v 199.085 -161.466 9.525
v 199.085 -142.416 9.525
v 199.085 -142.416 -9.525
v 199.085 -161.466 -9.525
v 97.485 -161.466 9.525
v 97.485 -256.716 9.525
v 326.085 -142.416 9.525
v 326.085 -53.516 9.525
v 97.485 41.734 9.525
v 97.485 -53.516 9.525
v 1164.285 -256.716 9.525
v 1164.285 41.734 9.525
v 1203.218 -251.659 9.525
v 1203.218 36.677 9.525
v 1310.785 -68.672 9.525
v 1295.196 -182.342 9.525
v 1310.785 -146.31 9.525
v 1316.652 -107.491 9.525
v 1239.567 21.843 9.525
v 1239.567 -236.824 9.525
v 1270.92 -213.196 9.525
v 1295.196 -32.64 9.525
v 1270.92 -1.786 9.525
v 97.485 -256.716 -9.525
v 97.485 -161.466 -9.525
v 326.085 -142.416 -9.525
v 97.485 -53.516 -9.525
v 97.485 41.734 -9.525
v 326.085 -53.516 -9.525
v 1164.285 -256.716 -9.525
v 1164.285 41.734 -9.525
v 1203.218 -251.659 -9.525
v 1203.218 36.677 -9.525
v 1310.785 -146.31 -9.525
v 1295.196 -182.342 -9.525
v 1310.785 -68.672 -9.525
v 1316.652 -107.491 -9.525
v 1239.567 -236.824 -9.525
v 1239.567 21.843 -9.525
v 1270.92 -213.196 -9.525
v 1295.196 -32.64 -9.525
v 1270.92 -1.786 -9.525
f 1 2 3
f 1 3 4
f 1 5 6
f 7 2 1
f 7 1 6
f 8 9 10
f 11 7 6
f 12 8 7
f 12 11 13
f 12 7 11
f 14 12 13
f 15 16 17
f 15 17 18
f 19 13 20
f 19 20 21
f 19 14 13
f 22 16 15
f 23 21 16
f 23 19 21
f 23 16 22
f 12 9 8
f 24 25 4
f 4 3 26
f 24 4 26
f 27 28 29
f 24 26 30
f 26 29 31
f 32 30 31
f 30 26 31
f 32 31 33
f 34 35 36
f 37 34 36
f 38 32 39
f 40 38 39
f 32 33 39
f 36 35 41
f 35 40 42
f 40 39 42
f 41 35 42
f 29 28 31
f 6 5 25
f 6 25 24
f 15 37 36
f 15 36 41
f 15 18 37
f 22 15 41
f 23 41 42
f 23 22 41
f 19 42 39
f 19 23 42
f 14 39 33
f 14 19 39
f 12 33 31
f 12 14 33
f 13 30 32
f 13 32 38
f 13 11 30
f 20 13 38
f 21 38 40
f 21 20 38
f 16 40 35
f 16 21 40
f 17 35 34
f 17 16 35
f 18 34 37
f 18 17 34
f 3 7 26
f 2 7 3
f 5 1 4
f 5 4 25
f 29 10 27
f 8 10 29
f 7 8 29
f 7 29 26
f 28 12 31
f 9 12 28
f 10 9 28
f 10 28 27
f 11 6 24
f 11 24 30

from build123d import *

# Parameters (mm, degrees)
F1_DEPTH = 9.525


with BuildPart() as f1:
    # F0 (on Top) → F1 (new body, symmetric)
    with BuildSketch(Plane.XY):
        with BuildLine():
            Line((1164.285257, 41.734285), (97.485257, 41.734285))
            Line((97.485257, 41.734285), (97.485257, -53.515715))
            Line((97.485257, -53.515715), (326.085257, -53.515715))
            Line((326.085257, -53.515715), (326.085257, -142.415715))
            Line((326.085257, -142.415715), (199.085257, -142.415715))
            Line((199.085257, -142.415715), (199.085257, -161.465715))
            Line((199.085257, -161.465715), (97.485257, -161.465715))
            Line((97.485257, -161.465715), (97.485257, -256.715715))
            Line((97.485257, -256.715715), (1164.285257, -256.715715))
            ThreePointArc((1164.285257, -256.715715), (1270.91989, -213.195534), (1316.65218, -107.490715))
            ThreePointArc((1316.65218, -107.490715), (1270.91989, -1.785896), (1164.285257, 41.734285))
        make_face()
    extrude(amount=F1_DEPTH, both=True)


solid = f1.part
